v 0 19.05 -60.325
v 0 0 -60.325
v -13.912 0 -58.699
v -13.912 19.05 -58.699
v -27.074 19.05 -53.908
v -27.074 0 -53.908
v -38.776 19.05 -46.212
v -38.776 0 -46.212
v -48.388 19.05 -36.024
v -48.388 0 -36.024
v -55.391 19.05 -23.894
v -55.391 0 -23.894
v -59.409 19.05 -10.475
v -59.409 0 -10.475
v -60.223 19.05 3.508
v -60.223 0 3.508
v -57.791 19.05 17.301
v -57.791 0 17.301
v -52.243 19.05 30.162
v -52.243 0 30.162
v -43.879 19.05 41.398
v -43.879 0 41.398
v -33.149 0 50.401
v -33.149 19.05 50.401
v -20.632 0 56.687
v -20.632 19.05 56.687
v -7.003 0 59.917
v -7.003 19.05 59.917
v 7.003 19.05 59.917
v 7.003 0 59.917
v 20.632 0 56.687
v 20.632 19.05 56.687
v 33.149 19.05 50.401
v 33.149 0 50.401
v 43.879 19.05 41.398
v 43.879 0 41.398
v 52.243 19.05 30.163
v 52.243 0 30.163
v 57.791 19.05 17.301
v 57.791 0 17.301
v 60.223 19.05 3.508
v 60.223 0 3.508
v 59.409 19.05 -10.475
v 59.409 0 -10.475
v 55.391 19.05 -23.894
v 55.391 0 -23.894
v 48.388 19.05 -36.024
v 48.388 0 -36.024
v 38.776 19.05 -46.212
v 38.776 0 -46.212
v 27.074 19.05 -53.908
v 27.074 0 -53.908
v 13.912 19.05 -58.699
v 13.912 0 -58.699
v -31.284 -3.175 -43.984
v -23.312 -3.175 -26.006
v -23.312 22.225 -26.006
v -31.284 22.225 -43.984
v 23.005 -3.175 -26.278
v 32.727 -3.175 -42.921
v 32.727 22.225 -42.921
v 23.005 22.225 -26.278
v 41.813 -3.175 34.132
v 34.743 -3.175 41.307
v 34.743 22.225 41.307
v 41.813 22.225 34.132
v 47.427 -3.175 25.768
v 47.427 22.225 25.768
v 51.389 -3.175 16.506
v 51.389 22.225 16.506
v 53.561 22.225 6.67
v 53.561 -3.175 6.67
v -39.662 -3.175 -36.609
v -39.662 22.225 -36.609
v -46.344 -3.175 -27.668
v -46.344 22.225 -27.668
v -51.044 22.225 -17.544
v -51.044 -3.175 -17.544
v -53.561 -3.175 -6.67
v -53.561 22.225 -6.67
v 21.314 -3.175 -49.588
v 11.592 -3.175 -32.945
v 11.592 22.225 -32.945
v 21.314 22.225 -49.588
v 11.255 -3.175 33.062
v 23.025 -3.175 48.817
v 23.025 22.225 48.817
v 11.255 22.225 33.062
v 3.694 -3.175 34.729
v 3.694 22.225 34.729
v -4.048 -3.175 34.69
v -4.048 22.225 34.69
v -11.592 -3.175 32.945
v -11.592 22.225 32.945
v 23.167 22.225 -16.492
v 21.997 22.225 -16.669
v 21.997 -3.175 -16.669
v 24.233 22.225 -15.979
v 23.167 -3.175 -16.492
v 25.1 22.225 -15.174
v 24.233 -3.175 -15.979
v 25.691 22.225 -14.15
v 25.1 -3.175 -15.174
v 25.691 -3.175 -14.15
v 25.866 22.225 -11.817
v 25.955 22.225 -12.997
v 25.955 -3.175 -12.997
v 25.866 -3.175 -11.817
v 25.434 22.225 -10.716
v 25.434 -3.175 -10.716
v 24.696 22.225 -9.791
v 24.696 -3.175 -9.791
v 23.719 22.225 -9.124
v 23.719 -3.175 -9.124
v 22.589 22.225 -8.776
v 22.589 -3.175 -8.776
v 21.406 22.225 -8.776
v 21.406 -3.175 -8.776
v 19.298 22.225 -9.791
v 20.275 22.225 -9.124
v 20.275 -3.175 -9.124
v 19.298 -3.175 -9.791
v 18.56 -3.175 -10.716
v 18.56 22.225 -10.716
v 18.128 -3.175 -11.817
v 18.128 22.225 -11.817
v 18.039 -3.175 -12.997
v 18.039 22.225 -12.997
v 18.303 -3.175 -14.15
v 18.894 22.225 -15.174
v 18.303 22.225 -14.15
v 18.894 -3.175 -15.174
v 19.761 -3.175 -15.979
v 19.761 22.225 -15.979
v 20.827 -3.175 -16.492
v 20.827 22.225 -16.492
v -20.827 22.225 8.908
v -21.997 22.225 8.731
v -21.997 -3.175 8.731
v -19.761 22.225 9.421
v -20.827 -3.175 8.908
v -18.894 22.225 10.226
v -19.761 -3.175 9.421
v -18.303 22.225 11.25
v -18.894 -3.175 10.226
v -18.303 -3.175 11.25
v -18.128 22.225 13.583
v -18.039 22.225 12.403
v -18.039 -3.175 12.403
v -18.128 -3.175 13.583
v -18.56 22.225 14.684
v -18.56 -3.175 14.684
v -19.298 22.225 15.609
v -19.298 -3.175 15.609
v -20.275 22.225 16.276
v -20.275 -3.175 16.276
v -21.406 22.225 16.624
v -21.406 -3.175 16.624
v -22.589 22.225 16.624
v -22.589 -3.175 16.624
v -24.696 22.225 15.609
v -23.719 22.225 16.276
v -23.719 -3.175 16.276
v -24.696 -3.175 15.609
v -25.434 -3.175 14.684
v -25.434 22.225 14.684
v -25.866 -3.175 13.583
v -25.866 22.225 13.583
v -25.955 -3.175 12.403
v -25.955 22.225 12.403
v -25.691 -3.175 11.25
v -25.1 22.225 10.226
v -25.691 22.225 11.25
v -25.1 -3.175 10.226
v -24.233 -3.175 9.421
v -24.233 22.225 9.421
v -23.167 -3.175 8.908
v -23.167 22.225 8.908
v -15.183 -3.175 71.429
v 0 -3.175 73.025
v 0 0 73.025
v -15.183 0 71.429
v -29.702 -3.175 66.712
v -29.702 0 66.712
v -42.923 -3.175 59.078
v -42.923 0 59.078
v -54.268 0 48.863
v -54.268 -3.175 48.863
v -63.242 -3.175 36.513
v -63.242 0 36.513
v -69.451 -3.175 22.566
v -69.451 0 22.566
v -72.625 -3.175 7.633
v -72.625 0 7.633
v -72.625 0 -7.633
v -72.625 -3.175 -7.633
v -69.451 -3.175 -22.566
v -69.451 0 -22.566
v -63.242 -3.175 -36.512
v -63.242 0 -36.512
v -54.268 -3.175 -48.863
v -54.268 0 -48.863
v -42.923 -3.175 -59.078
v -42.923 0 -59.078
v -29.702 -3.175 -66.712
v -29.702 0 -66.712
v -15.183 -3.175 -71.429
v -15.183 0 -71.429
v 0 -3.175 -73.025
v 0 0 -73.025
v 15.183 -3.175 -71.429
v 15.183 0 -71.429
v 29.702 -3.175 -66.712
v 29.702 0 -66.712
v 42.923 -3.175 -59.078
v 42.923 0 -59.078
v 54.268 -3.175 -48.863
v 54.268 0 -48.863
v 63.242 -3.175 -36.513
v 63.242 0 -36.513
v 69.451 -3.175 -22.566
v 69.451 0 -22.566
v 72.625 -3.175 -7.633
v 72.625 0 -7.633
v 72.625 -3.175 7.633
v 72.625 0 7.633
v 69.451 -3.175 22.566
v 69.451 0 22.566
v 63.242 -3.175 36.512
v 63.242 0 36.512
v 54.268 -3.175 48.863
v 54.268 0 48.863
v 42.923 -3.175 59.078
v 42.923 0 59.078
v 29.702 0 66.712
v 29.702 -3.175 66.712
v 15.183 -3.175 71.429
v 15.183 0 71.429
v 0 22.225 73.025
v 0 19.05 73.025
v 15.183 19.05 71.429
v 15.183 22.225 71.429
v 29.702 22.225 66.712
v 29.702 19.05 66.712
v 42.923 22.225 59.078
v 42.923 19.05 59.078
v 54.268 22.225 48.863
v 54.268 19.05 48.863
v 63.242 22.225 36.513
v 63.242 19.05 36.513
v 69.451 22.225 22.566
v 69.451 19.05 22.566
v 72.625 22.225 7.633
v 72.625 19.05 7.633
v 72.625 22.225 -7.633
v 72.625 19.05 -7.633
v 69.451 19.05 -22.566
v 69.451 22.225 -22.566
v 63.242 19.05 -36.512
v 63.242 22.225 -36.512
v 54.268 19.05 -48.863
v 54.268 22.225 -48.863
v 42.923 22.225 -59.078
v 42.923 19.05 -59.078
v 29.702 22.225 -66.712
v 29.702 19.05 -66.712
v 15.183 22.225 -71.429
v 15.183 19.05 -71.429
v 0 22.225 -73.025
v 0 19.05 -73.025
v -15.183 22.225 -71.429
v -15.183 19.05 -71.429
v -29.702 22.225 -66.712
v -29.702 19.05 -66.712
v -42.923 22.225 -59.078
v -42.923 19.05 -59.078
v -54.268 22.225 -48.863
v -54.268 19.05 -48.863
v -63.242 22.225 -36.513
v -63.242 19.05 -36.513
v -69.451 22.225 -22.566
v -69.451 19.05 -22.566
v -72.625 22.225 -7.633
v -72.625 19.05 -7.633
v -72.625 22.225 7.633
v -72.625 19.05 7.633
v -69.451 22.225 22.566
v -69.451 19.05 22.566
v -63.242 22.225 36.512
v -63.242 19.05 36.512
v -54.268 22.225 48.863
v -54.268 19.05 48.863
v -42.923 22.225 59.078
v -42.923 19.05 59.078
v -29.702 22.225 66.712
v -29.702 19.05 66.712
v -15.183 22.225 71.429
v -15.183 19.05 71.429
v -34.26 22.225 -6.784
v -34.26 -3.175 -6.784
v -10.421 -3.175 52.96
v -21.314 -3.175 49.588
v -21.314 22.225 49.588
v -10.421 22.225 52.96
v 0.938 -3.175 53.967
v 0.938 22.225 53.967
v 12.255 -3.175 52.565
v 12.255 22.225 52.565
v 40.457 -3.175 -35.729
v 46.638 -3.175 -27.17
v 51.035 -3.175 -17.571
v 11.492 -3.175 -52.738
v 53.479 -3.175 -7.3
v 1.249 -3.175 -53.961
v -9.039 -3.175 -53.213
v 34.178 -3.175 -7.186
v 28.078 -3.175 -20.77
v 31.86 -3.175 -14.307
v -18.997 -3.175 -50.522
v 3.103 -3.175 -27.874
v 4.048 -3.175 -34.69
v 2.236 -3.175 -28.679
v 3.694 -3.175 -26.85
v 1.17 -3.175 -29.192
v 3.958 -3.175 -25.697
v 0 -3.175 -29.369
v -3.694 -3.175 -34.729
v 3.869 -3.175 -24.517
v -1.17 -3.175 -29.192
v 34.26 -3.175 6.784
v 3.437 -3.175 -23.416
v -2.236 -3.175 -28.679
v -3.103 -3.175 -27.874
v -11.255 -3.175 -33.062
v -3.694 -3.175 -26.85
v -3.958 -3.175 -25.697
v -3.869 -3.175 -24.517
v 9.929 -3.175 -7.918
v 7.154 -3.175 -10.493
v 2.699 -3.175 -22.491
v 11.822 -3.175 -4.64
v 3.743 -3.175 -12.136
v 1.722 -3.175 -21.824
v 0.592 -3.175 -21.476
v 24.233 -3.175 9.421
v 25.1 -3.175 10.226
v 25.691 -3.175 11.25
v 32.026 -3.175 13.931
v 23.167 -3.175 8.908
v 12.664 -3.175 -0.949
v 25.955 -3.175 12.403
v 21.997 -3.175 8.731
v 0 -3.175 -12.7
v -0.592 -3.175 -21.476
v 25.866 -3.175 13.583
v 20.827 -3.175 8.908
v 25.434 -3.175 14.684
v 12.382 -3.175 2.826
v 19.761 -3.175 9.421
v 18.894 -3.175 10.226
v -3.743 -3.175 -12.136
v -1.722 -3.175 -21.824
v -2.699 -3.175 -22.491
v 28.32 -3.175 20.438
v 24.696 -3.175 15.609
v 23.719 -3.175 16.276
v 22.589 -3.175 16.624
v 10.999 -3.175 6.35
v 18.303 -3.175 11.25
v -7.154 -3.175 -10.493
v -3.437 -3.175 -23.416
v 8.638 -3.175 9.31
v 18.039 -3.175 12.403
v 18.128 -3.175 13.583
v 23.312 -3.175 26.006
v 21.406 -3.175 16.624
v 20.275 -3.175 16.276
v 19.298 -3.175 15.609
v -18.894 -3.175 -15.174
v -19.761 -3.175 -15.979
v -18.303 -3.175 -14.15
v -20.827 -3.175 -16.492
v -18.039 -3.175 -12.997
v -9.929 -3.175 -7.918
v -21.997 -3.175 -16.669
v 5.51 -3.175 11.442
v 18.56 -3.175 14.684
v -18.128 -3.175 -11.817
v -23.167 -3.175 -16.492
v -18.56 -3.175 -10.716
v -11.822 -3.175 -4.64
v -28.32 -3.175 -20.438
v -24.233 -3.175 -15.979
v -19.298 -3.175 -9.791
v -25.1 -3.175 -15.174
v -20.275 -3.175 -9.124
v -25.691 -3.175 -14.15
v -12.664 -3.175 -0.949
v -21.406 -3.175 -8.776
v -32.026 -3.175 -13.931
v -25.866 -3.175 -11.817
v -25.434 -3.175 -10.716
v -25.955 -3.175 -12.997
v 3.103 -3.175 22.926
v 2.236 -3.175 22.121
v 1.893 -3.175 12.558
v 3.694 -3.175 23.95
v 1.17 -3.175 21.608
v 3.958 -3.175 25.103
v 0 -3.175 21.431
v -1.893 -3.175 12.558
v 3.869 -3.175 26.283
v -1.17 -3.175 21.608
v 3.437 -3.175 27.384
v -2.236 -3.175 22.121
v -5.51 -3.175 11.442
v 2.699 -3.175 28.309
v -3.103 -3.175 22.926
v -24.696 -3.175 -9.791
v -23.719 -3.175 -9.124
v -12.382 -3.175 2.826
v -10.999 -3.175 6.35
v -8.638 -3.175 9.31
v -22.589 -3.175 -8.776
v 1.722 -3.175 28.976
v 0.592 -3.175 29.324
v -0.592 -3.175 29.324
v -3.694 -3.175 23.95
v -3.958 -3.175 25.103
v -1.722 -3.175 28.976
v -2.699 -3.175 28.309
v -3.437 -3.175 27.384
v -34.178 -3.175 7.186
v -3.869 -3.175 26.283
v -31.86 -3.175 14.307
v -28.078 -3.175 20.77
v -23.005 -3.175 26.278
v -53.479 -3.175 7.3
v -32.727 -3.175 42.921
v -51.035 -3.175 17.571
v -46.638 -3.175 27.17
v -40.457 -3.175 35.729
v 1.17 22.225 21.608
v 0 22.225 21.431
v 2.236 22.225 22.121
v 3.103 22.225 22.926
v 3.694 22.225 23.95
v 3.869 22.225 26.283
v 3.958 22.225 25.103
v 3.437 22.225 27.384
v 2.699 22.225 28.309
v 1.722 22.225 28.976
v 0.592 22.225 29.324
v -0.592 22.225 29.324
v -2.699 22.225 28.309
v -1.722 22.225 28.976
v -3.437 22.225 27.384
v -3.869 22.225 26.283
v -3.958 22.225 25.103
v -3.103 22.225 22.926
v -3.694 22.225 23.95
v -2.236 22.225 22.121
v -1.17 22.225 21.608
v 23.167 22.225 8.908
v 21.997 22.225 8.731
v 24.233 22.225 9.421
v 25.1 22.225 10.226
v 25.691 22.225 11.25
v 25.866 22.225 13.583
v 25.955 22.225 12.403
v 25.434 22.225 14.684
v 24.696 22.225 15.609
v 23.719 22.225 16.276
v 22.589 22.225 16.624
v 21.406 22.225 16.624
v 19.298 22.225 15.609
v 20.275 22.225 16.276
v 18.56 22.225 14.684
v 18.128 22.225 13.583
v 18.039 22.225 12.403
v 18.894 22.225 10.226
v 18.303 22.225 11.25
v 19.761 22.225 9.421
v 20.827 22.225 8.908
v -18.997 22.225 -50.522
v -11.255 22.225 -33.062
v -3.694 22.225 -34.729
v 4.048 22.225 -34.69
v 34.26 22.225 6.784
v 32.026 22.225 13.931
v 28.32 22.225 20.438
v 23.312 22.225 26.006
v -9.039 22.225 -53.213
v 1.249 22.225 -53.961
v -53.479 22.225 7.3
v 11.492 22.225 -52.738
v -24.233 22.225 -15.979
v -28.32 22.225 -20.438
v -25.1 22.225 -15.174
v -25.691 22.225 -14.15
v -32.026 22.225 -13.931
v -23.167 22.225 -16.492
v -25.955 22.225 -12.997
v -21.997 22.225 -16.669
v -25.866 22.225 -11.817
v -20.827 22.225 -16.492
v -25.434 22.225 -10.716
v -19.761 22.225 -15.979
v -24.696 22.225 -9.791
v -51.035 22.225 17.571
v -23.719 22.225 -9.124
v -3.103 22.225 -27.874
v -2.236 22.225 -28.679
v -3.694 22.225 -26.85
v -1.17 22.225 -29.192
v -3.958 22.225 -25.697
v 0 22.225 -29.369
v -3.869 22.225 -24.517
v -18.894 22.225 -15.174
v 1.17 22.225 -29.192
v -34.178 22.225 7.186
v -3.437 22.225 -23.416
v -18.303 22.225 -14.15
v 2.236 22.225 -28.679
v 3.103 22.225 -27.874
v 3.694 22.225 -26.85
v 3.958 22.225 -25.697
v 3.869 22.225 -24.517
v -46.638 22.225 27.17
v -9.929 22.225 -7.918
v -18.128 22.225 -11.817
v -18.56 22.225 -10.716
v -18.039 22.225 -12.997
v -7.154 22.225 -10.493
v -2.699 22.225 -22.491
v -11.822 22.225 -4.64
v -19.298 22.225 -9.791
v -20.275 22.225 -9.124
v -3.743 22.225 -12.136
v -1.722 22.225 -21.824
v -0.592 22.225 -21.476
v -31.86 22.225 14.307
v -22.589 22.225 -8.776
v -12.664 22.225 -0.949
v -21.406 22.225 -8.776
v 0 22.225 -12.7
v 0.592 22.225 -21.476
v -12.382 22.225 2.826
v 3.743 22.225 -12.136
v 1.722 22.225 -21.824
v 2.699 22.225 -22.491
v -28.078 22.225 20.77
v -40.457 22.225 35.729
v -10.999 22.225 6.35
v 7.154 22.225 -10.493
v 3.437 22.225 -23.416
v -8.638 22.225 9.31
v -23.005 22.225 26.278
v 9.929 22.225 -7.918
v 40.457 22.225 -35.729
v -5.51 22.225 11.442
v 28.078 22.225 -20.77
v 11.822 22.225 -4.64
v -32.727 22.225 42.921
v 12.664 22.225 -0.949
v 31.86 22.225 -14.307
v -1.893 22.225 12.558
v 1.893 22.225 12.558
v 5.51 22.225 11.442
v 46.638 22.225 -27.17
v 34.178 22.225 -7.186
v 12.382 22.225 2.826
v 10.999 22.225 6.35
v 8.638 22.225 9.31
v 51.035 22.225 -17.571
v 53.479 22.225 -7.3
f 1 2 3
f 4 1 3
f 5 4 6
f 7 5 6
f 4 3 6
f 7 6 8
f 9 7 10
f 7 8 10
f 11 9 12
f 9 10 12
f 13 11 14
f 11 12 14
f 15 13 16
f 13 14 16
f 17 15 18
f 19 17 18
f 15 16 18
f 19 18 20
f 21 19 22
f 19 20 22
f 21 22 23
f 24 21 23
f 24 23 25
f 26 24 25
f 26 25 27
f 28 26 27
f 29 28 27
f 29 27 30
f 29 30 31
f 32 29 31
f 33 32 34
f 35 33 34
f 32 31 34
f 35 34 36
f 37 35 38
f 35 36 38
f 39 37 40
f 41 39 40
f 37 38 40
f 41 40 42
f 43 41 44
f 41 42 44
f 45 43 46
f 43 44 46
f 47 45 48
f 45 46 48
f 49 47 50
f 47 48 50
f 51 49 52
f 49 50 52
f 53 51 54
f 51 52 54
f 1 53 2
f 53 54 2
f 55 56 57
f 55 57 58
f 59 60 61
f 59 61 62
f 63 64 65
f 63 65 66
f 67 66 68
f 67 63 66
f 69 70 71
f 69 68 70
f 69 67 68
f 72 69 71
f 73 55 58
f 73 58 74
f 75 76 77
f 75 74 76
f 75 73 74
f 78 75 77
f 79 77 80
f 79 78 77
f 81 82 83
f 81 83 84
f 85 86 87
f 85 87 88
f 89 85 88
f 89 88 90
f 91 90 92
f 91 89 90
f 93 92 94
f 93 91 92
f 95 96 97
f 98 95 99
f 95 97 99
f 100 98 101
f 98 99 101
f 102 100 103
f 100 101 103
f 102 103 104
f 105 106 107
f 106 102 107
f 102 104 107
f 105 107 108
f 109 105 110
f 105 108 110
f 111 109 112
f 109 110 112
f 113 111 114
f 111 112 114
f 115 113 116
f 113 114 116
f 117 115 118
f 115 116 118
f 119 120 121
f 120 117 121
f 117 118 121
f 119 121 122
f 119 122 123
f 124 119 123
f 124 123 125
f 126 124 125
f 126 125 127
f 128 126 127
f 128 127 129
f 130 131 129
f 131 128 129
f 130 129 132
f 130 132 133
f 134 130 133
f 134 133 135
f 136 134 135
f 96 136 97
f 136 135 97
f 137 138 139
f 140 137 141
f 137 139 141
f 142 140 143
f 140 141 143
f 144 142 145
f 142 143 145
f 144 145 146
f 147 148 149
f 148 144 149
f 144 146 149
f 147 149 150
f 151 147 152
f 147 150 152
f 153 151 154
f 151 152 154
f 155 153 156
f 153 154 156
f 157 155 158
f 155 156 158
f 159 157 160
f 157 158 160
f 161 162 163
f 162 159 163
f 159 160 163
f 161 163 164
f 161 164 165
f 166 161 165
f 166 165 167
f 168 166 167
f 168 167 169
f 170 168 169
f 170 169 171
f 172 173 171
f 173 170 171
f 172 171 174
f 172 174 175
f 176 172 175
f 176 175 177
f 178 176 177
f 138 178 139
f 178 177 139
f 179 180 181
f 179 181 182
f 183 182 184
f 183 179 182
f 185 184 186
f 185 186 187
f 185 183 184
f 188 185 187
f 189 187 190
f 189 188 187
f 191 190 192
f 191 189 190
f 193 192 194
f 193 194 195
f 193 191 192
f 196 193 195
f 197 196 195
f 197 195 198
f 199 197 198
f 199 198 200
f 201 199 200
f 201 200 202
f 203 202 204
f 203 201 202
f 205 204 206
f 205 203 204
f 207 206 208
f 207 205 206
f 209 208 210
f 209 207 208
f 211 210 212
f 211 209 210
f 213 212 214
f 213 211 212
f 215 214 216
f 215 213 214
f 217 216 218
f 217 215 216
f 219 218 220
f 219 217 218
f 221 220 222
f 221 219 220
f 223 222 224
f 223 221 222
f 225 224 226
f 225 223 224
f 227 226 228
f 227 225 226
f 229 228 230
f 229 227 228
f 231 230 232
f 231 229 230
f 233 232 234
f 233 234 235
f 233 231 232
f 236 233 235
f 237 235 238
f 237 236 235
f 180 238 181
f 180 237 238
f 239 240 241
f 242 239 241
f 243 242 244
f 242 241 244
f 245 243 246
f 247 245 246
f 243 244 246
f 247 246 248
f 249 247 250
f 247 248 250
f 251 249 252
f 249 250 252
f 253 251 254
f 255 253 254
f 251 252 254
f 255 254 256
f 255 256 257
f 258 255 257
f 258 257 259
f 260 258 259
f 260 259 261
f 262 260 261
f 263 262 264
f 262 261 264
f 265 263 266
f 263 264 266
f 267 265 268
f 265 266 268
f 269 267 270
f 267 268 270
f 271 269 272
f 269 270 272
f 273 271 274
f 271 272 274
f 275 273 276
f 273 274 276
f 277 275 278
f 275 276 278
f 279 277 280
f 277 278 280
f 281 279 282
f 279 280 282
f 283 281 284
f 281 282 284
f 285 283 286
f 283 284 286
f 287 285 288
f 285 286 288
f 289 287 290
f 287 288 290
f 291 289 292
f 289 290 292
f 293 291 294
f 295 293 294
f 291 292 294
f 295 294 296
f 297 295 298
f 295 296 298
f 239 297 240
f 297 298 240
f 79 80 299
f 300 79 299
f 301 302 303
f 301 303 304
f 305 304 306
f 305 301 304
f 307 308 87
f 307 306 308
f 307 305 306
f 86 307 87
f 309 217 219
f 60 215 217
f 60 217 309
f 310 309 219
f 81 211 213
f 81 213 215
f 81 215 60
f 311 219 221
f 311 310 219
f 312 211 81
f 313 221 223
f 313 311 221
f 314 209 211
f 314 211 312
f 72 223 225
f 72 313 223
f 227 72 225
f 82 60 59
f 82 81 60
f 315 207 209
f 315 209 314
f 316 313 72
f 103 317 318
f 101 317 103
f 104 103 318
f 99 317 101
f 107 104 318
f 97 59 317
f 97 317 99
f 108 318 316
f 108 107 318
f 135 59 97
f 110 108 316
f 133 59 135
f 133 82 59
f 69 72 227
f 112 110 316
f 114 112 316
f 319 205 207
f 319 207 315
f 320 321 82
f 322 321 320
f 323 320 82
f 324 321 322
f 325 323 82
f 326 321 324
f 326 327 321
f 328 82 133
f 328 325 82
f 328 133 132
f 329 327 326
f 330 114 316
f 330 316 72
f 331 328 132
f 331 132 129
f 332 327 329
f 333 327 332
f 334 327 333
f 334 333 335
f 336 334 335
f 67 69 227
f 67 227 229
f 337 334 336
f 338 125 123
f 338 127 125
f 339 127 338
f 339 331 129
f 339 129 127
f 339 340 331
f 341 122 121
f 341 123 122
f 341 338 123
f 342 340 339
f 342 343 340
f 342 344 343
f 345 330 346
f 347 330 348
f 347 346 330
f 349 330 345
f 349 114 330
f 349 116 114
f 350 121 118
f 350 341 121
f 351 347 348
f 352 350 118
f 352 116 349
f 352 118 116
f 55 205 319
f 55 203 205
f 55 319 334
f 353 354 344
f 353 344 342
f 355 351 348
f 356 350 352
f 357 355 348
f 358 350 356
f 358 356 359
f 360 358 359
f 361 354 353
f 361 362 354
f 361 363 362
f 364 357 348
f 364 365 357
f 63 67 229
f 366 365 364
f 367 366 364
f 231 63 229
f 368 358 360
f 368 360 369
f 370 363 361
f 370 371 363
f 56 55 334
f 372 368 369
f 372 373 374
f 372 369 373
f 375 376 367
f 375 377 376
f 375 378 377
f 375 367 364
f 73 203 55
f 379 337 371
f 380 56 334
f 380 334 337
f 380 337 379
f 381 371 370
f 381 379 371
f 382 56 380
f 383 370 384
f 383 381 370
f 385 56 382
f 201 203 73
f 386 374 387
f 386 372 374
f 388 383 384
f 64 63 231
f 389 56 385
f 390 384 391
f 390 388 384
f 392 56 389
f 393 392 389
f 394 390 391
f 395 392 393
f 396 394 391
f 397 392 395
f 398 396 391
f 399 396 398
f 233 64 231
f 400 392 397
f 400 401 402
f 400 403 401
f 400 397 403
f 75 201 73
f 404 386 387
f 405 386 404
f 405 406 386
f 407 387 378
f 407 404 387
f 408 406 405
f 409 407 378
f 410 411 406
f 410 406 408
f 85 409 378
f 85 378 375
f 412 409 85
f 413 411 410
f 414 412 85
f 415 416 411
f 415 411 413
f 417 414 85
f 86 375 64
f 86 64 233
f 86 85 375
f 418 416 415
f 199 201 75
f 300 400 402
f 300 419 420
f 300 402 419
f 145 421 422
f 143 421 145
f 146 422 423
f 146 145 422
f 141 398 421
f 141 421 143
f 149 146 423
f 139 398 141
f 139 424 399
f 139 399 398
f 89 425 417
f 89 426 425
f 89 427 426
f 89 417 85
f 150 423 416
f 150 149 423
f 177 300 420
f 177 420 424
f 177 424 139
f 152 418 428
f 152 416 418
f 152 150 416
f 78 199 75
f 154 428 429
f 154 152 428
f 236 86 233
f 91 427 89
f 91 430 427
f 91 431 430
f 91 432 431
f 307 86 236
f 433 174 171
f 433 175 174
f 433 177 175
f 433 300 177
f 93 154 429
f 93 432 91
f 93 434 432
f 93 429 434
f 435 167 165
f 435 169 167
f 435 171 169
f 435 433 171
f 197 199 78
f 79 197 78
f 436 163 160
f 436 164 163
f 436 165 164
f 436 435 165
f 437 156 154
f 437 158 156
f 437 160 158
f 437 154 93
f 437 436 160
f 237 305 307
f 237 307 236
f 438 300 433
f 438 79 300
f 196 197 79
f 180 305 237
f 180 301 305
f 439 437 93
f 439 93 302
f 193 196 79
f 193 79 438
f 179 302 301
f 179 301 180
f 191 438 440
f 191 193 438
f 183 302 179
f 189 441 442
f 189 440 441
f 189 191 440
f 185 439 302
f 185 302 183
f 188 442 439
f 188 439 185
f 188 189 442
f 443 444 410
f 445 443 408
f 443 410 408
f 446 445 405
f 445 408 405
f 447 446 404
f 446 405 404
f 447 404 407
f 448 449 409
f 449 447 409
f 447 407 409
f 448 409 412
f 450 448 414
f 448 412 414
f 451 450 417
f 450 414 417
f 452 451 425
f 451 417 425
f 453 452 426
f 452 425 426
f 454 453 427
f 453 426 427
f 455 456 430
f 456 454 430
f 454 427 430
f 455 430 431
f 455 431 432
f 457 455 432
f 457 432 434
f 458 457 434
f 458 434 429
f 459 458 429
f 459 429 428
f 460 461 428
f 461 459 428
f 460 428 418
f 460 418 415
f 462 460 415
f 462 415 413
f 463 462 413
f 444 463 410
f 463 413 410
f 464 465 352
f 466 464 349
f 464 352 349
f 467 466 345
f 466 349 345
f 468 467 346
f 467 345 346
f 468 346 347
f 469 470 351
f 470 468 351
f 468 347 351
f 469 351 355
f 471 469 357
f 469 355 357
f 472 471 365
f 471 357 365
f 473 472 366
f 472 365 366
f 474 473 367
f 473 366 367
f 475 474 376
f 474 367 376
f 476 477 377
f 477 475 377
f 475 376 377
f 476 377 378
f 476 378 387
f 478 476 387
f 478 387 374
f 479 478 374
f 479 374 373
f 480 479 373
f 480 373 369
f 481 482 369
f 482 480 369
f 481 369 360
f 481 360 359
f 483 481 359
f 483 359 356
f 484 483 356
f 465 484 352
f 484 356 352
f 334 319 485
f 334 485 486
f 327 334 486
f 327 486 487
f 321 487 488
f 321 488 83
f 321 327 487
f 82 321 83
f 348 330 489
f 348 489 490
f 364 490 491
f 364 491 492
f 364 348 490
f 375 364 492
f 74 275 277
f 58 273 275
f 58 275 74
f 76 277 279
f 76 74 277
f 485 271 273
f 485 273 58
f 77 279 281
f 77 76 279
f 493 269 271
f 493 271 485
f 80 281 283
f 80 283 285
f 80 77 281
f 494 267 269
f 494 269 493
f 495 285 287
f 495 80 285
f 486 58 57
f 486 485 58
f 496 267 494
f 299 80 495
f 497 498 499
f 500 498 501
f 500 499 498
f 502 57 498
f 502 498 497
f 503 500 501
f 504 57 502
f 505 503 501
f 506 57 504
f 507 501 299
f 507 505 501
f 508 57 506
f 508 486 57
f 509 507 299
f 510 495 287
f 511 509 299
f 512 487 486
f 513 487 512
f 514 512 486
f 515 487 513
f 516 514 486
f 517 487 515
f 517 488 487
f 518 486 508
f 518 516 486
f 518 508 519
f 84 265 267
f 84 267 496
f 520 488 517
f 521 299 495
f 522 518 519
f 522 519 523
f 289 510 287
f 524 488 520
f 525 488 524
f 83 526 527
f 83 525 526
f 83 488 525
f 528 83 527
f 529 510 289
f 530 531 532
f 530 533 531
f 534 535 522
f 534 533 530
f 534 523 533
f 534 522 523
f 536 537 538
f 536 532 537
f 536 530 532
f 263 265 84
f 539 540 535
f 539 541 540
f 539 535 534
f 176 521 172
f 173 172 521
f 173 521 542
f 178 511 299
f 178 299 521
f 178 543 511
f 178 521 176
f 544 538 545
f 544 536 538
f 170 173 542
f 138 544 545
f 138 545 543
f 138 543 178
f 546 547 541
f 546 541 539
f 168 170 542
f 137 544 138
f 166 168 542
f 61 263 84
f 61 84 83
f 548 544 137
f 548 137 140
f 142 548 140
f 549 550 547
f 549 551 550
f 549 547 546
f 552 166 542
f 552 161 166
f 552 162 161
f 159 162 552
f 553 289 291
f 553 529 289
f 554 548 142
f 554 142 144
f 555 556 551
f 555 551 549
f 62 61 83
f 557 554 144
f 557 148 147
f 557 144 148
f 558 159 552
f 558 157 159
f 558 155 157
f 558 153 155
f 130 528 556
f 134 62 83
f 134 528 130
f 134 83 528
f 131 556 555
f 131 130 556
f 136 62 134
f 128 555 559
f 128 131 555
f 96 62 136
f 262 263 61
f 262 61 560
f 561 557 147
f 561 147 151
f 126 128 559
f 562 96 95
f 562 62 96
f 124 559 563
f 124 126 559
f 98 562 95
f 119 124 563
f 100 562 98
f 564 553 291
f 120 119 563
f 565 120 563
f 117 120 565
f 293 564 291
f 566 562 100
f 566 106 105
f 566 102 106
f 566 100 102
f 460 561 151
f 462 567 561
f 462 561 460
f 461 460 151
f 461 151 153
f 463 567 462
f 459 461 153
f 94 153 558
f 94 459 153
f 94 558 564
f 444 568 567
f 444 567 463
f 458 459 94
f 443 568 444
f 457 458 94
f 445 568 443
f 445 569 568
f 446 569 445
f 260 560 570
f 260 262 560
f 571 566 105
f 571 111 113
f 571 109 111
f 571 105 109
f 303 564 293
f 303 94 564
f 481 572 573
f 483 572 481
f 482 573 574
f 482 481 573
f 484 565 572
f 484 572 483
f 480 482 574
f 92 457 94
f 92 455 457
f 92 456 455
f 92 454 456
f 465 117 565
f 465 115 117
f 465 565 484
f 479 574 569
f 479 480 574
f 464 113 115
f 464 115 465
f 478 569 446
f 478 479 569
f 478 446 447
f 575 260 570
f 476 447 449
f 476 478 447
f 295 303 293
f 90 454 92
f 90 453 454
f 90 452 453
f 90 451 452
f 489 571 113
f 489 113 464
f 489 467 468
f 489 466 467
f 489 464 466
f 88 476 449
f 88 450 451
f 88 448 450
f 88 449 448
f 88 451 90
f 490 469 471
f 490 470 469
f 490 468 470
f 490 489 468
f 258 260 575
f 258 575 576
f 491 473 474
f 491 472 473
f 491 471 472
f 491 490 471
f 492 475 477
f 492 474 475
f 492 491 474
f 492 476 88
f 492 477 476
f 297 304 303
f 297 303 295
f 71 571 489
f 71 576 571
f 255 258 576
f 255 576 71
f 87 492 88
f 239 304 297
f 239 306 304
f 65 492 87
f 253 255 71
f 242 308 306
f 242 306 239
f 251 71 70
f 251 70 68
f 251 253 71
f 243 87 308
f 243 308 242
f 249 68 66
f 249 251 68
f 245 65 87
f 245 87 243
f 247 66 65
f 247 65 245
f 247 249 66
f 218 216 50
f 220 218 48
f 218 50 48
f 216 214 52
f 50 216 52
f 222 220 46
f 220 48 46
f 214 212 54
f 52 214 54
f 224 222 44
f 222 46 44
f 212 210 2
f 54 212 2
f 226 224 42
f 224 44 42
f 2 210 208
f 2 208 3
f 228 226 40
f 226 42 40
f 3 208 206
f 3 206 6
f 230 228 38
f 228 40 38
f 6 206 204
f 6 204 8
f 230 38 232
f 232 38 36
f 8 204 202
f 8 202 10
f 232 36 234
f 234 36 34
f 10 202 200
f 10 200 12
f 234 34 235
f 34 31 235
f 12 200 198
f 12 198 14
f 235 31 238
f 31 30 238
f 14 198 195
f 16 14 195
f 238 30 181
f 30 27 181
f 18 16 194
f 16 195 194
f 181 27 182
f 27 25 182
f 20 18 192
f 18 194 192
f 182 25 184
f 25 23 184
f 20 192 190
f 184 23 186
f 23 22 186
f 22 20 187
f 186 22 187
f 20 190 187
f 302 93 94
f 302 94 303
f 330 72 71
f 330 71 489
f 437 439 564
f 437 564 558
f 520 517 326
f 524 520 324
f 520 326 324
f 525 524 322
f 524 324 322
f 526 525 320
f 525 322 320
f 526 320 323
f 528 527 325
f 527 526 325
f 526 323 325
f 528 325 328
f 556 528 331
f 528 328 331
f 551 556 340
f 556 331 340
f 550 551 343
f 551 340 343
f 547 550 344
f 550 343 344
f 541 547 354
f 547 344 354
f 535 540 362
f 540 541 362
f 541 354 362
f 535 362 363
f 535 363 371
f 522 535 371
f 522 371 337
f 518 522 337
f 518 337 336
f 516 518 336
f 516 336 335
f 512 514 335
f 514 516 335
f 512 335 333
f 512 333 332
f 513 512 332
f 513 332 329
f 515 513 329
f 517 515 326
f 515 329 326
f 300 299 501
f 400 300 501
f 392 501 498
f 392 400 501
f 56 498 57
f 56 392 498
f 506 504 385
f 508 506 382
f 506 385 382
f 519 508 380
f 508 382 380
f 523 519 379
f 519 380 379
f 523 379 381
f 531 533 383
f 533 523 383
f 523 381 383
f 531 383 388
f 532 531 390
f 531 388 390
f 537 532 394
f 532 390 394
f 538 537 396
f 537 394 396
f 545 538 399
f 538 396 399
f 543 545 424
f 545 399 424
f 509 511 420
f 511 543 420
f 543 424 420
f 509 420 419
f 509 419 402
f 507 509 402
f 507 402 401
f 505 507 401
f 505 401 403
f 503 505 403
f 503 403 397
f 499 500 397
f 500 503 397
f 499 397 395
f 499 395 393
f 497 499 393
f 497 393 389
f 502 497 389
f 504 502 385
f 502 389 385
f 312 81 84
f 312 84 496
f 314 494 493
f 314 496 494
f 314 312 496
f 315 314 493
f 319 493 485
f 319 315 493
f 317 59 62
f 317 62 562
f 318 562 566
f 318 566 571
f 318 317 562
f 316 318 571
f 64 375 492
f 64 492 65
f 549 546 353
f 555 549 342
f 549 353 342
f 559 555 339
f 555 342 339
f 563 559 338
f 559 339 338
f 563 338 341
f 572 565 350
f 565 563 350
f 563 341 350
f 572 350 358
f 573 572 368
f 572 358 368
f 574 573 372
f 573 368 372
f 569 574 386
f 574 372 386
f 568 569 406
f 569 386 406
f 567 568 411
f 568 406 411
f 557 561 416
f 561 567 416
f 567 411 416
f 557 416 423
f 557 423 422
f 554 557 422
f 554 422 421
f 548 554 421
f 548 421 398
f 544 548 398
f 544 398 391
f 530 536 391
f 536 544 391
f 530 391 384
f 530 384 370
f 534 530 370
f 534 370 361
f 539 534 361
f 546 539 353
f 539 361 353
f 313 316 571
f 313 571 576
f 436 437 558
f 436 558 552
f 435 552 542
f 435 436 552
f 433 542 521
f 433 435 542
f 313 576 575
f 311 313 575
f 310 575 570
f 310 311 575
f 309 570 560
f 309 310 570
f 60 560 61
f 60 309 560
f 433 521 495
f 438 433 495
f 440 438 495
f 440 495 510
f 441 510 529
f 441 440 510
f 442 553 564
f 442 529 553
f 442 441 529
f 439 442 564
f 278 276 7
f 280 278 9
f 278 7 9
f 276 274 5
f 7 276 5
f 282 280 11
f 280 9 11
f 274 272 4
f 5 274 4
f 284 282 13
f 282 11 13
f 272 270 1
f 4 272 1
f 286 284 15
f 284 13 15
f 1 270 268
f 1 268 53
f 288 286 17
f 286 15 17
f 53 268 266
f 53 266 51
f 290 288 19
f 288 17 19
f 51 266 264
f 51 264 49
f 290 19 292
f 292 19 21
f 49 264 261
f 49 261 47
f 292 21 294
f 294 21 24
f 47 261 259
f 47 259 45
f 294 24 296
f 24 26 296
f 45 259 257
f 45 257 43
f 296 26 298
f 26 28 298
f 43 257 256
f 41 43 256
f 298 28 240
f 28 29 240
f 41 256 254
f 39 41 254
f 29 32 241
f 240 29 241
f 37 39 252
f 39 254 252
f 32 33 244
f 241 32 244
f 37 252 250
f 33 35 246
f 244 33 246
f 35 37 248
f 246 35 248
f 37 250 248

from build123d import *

# Parameters (mm, degrees)
SKETCH2_R               = 60.325
SKETCH2_R_2             = 3.96875
SKETCH2_R_3             = 12.7
BOSS_EXTRUDE1_DEPTH     = 19.05
SKETCH3_R               = 73.025
SKETCH3_R_2             = 3.96875
SKETCH3_R_3             = 12.7
BOSS_EXTRUDE2_DEPTH     = 3.175
BOSS_EXTRUDE3_START     = 3.175
SKETCH4_R               = 73.025
SKETCH4_R_2             = 12.7
SKETCH4_R_3             = 3.96875
BOSS_EXTRUDE3_DEPTH     = 3.175
CUT_EXTRUDE1_DEPTH      = 106.637360224
CUT_EXTRUDE1_DEPTH_BACK = 106.637360224


with BuildPart() as part:
    # Sketch2 → Boss-Extrude1 (new body)
    with BuildSketch(Plane(origin=(0, 0, 0), x_dir=(1, 0, 0), z_dir=(0, 1, 0))):
        with Locations(Location((0, 0, 0), (0, 0, 90))):
            Circle(SKETCH2_R)
        with Locations(Location((0, 25.4, 0), (0, 0, 90))):
            Circle(SKETCH2_R_2, mode=Mode.SUBTRACT)
        with Locations(Location((21.997045256, 12.7, 0), (0, 0, 90))):
            Circle(SKETCH2_R_2, mode=Mode.SUBTRACT)
        with Locations(Location((21.997045256, -12.7, 0), (0, 0, 90))):
            Circle(SKETCH2_R_2, mode=Mode.SUBTRACT)
        with Locations(Location((0, -25.4, 0), (0, 0, 90))):
            Circle(SKETCH2_R_2, mode=Mode.SUBTRACT)
        with Locations(Location((-21.997045256, -12.7, 0), (0, 0, 90))):
            Circle(SKETCH2_R_2, mode=Mode.SUBTRACT)
        with Locations(Location((-21.997045256, 12.7, 0), (0, 0, 90))):
            Circle(SKETCH2_R_2, mode=Mode.SUBTRACT)
        with Locations(Location((0, 0, 0), (0, 0, 90))):
            Circle(SKETCH2_R_3, mode=Mode.SUBTRACT)
    extrude(amount=BOSS_EXTRUDE1_DEPTH)

    # Sketch3 → Boss-Extrude2 (add)
    with BuildSketch(Plane(origin=(0, 19.05, 0), x_dir=(1, 0, 0), z_dir=(0, 1, 0))):
        with Locations(Location((0, 0, 0), (0, 0, 270))):
            Circle(SKETCH3_R)
        with Locations(Location((0, 25.4, 0), (0, 0, 90))):
            Circle(SKETCH3_R_2, mode=Mode.SUBTRACT)
        with Locations(Location((21.997045256, 12.7, 0), (0, 0, 90))):
            Circle(SKETCH3_R_2, mode=Mode.SUBTRACT)
        with Locations(Location((21.997045256, -12.7, 0), (0, 0, 90))):
            Circle(SKETCH3_R_2, mode=Mode.SUBTRACT)
        with Locations(Location((0, -25.4, 0), (0, 0, 90))):
            Circle(SKETCH3_R_2, mode=Mode.SUBTRACT)
        with Locations(Location((-21.997045256, -12.7, 0), (0, 0, 90))):
            Circle(SKETCH3_R_2, mode=Mode.SUBTRACT)
        with Locations(Location((0, 0, 0), (0, 0, 90))):
            Circle(SKETCH3_R_3, mode=Mode.SUBTRACT)
        with Locations(Location((-21.997045256, 12.7, 0), (0, 0, 90))):
            Circle(SKETCH3_R_2, mode=Mode.SUBTRACT)
    extrude(amount=BOSS_EXTRUDE2_DEPTH)

    # Sketch4 → Boss-Extrude3 (add)
    with BuildSketch(Plane.XZ.offset(BOSS_EXTRUDE3_START)):
        with Locations(Location((0, 0, 0), (0, 0, 90))):
            Circle(SKETCH4_R)
        with Locations(Location((0, 0, 0), (0, 0, 270))):
            Circle(SKETCH4_R_2, mode=Mode.SUBTRACT)
        with Locations(Location((-21.997045256, -12.7, 0), (0, 0, 270))):
            Circle(SKETCH4_R_3, mode=Mode.SUBTRACT)
        with Locations(Location((0, -25.4, 0), (0, 0, 270))):
            Circle(SKETCH4_R_3, mode=Mode.SUBTRACT)
        with Locations(Location((21.997045256, -12.7, 0), (0, 0, 270))):
            Circle(SKETCH4_R_3, mode=Mode.SUBTRACT)
        with Locations(Location((21.997045256, 12.7, 0), (0, 0, 270))):
            Circle(SKETCH4_R_3, mode=Mode.SUBTRACT)
        with Locations(Location((0, 25.4, 0), (0, 0, 270))):
            Circle(SKETCH4_R_3, mode=Mode.SUBTRACT)
        with Locations(Location((-21.997045256, 12.7, 0), (0, 0, 270))):
            Circle(SKETCH4_R_3, mode=Mode.SUBTRACT)
    extrude(amount=-BOSS_EXTRUDE3_DEPTH)

    # Sketch6 → Cut-Extrude1 (cut, two sides: drawn at the far end of the back side and taken through both)
    with BuildSketch(Plane(origin=(0, 0, 0), x_dir=(1, 0, 0), z_dir=(0, 1, 0)).offset(-CUT_EXTRUDE1_DEPTH_BACK)):
        with BuildLine():
            ThreePointArc((21.314275493, 49.588328115), (1.249191015, 53.960542499), (-18.996723984, 50.521531082))
            Line((-18.996723984, 50.521531082), (-11.255118383, 33.061729162))
            ThreePointArc((-11.255118383, 33.061729162), (0.178151467, 34.924545624), (11.591822226, 32.945186029))
            Line((11.591822226, 32.945186029), (21.314275493, 49.588328115))
        make_face()
        with BuildLine():
            ThreePointArc((-31.283856312, 43.984326291), (-46.343943604, 27.668384778), (-53.561272173, 6.670138541))
            Line((-53.561272173, 6.670138541), (-34.259856576, 6.783645952))
            ThreePointArc((-34.259856576, 6.783645952), (-30.348105608, 17.284331372), (-23.312207546, 26.005703304))
            Line((-23.312207546, 26.005703304), (-31.283856312, 43.984326291))
        make_face()
        with BuildLine():
            ThreePointArc((-53.47911905, -7.299619899), (-46.638038937, -27.169724863), (-32.727191245, -42.921225264))
            Line((-32.727191245, -42.921225264), (-23.004737979, -26.278083178))
            ThreePointArc((-23.004737979, -26.278083178), (-30.1427228, -17.640064829), (-34.177703438, -7.186112487))
            Line((-34.177703438, -7.186112487), (-53.47911905, -7.299619899))
        make_face()
        with BuildLine():
            Line((-11.591822226, -32.945186029), (-21.314275493, -49.588328115))
            ThreePointArc((-21.314275493, -49.588328115), (0.938377322, -53.966842348), (23.025356811, -48.817349054))
            Line((23.025356811, -48.817349054), (11.255118563, -33.061729101))
            ThreePointArc((11.255118563, -33.061729101), (-0.178151371, -34.924545625), (-11.591822226, -32.945186029))
        make_face()
        with BuildLine():
            Line((23.312207688, -26.005703177), (34.742784352, -41.306652739))
            ThreePointArc((34.742784352, -41.306652739), (47.427034742, -25.767751175), (53.56127215, -6.670138728))
            Line((53.56127215, -6.670138728), (34.259856539, -6.783646139))
            ThreePointArc((34.259856539, -6.783646139), (30.348105608, -17.284331372), (23.312207688, -26.005703177))
        make_face()
        with BuildLine():
            Line((34.177703478, 7.186112301), (53.479119075, 7.299619712))
            ThreePointArc((53.479119075, 7.299619712), (46.638038984, 27.169724781), (32.727191245, 42.921225264))
            Line((32.727191245, 42.921225264), (23.004737979, 26.278083178))
            ThreePointArc((23.004737979, 26.278083178), (30.142722848, 17.640064747), (34.177703478, 7.186112301))
        make_face()
    extrude(amount=CUT_EXTRUDE1_DEPTH + CUT_EXTRUDE1_DEPTH_BACK, mode=Mode.SUBTRACT)


solid = part.part
